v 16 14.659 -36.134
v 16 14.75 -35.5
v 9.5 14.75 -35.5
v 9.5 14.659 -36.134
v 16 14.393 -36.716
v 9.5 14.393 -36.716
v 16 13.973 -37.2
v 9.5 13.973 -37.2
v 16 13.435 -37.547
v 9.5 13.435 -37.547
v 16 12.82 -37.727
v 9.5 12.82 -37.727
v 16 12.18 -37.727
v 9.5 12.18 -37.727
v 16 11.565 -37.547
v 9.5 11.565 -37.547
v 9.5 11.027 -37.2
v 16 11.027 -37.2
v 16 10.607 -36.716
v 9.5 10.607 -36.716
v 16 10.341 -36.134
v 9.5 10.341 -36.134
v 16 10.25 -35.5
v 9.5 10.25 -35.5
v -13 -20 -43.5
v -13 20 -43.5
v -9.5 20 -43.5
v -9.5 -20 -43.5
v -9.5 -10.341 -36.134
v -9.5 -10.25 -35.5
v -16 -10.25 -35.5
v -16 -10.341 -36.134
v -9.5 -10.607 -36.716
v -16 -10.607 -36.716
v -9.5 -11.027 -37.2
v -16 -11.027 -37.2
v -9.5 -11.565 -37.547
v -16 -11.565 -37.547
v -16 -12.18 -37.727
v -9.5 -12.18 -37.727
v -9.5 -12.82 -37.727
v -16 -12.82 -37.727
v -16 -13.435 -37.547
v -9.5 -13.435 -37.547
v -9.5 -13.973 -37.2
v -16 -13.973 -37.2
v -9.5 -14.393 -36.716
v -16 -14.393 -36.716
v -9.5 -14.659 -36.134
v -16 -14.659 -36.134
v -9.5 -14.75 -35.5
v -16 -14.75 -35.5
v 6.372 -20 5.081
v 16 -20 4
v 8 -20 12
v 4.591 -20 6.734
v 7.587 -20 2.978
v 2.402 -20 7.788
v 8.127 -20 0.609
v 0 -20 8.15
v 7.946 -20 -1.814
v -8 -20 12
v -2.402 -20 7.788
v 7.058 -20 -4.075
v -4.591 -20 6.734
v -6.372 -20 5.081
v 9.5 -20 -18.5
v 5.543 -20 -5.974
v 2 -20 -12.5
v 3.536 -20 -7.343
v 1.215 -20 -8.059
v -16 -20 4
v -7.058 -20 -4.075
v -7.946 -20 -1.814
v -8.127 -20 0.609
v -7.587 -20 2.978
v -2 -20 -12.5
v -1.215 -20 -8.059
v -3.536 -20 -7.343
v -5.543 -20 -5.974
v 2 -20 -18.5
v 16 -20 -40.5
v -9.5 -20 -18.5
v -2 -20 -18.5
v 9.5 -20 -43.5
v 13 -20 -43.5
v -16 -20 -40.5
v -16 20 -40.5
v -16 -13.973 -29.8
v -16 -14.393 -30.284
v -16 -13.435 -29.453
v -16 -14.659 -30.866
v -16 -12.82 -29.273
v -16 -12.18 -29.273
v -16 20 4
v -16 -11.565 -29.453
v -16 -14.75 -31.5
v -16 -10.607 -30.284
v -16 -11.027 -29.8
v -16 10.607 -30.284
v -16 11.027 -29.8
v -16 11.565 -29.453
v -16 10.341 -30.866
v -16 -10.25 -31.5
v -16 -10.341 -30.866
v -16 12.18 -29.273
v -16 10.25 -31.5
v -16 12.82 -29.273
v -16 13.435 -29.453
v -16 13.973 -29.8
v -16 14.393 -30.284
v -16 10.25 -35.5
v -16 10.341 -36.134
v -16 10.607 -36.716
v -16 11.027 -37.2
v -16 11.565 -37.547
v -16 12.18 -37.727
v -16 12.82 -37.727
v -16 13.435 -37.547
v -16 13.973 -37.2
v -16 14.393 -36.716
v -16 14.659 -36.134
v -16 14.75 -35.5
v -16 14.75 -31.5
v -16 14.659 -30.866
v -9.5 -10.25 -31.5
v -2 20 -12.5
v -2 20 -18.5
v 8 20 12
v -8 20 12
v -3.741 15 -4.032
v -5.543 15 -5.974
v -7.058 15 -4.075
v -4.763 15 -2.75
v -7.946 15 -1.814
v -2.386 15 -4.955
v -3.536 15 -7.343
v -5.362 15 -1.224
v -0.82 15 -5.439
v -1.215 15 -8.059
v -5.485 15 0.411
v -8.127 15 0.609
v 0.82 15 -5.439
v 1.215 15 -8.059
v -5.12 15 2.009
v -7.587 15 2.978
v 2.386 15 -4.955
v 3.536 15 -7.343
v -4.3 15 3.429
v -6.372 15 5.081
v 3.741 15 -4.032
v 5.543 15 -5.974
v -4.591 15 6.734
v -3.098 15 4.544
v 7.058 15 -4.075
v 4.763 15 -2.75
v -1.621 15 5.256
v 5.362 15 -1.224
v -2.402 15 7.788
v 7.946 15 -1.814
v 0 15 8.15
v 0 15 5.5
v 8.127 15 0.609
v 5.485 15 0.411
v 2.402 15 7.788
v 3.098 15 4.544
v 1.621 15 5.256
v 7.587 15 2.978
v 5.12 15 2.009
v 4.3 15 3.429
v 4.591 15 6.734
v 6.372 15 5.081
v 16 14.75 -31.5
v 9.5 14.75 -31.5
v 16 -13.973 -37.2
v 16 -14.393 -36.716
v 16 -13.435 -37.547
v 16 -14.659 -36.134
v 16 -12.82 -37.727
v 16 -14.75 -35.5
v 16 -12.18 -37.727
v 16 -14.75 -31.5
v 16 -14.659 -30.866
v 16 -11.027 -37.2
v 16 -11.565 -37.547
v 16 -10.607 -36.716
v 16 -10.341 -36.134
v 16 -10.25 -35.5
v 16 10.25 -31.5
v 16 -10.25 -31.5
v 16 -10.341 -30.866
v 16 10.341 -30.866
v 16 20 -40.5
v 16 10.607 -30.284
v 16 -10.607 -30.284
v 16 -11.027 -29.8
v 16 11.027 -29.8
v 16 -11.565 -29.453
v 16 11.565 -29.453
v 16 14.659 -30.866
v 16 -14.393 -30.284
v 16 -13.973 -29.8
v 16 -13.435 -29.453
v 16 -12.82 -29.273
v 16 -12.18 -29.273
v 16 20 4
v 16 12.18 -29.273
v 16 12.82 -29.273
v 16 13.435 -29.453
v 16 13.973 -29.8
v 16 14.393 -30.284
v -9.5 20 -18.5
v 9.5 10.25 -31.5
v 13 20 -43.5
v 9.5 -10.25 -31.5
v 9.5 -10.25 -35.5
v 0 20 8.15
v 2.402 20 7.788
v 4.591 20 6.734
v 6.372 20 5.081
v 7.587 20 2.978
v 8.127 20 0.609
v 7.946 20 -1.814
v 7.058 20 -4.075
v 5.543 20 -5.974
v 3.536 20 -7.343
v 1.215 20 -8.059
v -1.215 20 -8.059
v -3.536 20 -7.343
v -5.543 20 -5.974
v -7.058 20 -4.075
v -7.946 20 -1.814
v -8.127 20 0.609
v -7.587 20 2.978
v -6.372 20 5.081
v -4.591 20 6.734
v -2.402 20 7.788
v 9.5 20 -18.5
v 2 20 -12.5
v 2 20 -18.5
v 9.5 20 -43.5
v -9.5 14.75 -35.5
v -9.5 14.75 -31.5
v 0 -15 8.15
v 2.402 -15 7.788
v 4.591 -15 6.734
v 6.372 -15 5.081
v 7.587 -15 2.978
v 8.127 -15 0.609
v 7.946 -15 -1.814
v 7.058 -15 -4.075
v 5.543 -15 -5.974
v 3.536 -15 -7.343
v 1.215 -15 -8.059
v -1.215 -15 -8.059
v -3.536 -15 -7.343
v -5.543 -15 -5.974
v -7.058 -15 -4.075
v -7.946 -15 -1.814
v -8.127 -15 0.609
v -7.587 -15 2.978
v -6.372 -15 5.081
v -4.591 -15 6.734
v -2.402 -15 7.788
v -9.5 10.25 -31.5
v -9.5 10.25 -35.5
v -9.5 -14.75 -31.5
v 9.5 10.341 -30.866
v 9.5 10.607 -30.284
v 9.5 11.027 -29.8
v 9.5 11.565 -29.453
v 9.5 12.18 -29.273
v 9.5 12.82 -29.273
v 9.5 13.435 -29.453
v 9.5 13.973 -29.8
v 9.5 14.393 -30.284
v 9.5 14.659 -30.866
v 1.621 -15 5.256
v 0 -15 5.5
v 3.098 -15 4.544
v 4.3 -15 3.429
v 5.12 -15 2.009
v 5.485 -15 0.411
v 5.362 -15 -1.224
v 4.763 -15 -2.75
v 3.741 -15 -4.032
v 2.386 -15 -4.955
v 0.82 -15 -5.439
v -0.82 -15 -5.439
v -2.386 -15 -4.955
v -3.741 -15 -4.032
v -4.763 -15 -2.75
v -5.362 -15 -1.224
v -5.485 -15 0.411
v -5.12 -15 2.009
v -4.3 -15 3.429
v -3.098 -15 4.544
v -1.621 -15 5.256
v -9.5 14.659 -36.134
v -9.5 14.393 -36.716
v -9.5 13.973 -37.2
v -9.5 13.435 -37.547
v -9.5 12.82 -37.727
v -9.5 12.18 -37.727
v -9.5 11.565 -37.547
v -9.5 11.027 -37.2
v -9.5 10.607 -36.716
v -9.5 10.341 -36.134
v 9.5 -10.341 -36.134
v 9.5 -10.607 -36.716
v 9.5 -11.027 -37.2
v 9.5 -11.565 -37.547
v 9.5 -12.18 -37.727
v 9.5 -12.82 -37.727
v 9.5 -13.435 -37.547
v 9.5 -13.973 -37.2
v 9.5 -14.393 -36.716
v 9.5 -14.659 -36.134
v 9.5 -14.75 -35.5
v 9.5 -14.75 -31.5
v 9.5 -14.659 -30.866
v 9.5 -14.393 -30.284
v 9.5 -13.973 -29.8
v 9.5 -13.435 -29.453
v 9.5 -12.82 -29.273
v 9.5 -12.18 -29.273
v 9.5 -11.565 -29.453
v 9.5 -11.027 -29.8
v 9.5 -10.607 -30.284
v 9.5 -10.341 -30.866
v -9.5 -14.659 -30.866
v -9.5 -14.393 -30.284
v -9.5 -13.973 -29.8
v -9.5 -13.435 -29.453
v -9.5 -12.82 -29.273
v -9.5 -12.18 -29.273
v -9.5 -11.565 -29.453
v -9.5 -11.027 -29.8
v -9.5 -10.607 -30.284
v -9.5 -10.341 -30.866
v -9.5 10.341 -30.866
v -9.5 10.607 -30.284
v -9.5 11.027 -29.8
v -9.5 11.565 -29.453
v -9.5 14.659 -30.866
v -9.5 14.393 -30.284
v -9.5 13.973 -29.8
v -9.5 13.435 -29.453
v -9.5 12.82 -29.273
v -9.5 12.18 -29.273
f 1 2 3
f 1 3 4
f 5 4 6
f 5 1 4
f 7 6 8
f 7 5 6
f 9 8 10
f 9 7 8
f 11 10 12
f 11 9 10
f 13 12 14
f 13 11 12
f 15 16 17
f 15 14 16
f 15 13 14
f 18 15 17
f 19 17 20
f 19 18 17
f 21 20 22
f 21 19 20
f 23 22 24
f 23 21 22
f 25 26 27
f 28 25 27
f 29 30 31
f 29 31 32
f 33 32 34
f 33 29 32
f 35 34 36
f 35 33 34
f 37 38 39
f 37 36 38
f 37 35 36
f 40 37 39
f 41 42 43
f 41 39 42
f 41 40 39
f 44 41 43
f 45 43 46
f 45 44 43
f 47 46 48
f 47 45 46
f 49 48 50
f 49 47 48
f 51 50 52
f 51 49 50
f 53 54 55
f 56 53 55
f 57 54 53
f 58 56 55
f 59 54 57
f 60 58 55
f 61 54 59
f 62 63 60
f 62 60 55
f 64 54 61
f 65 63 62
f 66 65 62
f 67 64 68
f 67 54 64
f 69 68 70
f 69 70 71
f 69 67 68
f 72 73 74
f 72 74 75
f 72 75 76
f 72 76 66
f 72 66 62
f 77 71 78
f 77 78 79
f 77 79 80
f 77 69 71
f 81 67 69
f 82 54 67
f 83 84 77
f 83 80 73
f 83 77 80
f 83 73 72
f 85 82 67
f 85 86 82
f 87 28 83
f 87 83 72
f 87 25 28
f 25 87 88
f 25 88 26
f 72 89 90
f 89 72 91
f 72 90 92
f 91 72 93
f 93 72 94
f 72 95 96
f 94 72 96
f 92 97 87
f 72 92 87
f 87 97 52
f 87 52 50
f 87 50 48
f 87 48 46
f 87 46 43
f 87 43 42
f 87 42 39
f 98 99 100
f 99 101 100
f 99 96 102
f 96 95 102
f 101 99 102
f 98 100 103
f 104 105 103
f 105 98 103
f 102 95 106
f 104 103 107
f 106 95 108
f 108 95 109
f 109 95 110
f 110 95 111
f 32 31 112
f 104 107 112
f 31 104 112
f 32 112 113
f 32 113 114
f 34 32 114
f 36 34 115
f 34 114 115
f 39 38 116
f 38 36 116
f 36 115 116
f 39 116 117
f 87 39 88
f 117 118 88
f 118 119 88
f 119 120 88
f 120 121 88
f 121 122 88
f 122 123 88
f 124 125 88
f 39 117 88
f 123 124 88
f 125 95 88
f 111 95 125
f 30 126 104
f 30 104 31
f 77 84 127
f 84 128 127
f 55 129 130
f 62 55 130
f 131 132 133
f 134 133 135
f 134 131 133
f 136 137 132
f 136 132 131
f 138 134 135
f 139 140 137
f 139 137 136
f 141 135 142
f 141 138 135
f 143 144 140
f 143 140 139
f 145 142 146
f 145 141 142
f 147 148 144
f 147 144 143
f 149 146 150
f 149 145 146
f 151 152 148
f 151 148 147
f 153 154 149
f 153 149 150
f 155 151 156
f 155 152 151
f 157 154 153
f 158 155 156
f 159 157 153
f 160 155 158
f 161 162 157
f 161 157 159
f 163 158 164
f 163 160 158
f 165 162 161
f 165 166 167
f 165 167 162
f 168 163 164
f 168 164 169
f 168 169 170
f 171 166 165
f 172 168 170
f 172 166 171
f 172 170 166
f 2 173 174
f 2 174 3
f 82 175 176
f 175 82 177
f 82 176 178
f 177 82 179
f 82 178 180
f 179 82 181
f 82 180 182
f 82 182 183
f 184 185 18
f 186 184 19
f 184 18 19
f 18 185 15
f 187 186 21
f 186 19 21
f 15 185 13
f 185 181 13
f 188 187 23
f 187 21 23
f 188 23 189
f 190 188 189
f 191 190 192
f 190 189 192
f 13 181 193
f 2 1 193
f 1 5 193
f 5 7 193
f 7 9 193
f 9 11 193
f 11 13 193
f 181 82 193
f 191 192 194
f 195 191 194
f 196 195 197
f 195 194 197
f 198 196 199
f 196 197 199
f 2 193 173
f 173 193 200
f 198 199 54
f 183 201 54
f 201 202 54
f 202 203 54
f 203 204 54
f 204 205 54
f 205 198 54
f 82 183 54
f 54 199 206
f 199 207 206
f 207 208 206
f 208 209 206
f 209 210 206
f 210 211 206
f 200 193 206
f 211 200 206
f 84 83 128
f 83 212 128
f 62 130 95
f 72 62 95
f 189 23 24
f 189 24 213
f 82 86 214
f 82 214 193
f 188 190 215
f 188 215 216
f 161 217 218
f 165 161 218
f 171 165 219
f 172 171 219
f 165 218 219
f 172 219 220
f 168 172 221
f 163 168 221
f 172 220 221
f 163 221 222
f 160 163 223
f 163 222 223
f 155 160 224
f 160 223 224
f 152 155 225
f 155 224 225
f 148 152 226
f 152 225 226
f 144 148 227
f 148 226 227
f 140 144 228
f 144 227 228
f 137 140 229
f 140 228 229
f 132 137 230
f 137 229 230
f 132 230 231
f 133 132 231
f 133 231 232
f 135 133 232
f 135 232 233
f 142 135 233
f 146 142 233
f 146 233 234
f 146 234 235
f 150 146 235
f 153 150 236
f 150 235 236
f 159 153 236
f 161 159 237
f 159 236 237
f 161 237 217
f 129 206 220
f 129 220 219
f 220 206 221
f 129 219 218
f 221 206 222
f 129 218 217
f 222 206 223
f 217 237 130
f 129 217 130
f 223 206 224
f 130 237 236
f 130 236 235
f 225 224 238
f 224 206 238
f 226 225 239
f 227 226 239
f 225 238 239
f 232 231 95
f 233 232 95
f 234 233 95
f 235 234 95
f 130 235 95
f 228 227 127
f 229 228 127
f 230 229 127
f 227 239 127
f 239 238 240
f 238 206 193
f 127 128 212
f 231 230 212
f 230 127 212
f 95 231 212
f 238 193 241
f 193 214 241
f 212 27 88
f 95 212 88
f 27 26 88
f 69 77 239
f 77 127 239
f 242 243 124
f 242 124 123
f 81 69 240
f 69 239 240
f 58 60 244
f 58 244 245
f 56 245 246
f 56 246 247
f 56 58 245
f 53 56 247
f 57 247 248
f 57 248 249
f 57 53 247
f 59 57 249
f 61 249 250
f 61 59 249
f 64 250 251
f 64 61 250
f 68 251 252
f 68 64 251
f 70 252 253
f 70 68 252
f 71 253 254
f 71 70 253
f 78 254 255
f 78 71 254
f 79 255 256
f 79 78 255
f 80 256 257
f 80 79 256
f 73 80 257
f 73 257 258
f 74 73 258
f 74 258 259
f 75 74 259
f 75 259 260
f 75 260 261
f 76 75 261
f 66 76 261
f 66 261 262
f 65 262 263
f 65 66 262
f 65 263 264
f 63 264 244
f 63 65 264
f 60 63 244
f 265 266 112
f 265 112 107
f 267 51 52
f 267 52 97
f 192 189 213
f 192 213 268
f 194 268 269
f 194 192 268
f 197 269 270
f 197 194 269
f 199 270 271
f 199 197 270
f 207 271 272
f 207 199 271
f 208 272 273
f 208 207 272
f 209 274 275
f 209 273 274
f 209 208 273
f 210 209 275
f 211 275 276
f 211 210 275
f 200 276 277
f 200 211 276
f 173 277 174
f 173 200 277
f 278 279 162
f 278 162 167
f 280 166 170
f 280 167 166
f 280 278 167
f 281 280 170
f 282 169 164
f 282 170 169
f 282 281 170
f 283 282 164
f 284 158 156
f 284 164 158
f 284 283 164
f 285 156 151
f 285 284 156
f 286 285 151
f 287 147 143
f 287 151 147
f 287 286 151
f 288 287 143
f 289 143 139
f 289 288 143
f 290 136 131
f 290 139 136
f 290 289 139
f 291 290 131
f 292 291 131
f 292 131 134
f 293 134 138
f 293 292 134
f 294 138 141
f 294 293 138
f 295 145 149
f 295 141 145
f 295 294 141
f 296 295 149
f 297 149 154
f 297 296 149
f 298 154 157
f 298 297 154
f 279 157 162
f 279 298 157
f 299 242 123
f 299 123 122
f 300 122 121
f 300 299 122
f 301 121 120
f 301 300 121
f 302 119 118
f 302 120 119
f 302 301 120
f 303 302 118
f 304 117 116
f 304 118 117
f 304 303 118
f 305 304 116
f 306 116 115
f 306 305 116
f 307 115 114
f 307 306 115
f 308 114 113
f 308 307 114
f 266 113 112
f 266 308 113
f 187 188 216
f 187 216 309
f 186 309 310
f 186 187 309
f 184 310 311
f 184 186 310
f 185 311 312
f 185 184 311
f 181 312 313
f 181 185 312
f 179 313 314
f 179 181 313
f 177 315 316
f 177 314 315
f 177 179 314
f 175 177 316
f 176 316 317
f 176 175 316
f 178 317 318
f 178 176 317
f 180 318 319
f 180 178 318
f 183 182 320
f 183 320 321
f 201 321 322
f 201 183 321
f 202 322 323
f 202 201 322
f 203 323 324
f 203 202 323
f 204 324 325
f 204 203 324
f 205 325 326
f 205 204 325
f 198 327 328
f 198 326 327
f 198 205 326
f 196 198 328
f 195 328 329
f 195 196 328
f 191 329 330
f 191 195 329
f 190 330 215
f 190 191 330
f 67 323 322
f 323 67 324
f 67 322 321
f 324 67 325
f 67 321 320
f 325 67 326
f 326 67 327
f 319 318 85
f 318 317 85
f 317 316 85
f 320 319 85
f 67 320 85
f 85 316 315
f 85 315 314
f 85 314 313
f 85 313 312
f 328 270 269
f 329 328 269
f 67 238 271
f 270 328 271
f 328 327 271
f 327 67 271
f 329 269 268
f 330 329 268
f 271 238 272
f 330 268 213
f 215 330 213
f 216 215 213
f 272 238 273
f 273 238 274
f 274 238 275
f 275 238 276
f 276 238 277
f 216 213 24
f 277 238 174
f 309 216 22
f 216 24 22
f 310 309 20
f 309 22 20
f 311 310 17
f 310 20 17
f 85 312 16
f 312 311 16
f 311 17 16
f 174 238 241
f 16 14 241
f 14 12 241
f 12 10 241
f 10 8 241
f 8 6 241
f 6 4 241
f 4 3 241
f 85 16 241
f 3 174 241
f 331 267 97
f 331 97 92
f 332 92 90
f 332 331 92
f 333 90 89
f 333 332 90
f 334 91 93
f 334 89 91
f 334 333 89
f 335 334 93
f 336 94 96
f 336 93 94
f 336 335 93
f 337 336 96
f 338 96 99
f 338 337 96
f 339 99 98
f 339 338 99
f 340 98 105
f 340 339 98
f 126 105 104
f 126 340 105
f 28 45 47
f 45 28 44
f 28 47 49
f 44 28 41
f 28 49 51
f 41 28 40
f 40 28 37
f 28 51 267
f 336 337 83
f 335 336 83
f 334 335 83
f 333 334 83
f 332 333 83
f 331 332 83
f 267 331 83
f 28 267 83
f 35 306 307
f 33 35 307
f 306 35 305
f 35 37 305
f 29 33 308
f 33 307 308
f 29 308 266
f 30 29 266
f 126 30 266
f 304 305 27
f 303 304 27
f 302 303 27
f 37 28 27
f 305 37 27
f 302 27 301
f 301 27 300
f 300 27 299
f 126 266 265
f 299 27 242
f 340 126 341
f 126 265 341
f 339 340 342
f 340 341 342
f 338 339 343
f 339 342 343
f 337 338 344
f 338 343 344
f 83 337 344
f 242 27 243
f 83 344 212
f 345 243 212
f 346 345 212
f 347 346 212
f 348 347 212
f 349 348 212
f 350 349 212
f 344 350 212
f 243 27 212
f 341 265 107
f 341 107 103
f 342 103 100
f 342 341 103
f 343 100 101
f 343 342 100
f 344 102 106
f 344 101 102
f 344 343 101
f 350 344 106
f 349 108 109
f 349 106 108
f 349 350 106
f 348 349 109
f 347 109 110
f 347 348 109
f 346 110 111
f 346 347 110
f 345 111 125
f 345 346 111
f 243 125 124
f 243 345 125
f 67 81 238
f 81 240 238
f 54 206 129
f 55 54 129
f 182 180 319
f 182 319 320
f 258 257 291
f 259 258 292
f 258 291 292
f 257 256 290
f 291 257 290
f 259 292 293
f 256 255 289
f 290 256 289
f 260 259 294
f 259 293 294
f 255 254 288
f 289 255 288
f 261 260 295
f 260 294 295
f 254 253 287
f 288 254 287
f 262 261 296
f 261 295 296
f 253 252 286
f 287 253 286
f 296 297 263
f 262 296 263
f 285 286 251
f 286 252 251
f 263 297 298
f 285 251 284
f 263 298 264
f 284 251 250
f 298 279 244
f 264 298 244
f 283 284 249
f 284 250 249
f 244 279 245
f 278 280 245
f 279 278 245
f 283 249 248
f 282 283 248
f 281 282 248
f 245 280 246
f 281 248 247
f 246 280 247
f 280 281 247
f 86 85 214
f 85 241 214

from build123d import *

# Parameters (mm, degrees)
SKETCH1_R           = 5.5
BOSS_EXTRUDE1_DEPTH = 20
SKETCH2_R           = 8.15
CUT_EXTRUDE1_DEPTH  = 5
CUT_EXTRUDE2_DEPTH  = 58.586890869


with BuildPart() as part:
    # Sketch1 → Boss-Extrude1 (new, symmetric)
    with BuildSketch(Plane(origin=(0, 0, 0), x_dir=(1, 0, 0), z_dir=(0, 1, 0))):
        Polygon((-9.5, 43.5), (-9.5, 18.5), (-2, 18.5), (-2, 12.5), (2, 12.5), (2, 18.5), (9.5, 18.5), (9.5, 43.5), (13, 43.5), (16, 40.5), (16, -4), (8, -12), (-8, -12), (-16, -4), (-16, 40.5), (-13, 43.5), align=None)
        with Locations(Location((0, 0, 0), (0, 0, 270))):
            Circle(SKETCH1_R, mode=Mode.SUBTRACT)
    extrude(amount=BOSS_EXTRUDE1_DEPTH, both=True)

    # Sketch2 → Cut-Extrude1 (cut)
    with BuildSketch(Plane(origin=(0, 20, 0), x_dir=(1, 0, 0), z_dir=(0, 1, 0))):
        with Locations(Location((0, 0, 0), (0, 0, 270))):
            Circle(SKETCH2_R)
    cut_extrude1 = extrude(amount=-CUT_EXTRUDE1_DEPTH, mode=Mode.SUBTRACT)

    # Mirror1: Cut-Extrude1 across plane
    add(cut_extrude1.mirror(Plane.ZX), mode=Mode.SUBTRACT)

    # Sketch3 → Cut-Extrude2 (cut, through all)
    with BuildSketch(Plane(origin=(16, 0, 0), x_dir=(0, 0, -1), z_dir=(1, 0, 0))):
        with BuildLine():
            Line((35.5, 10.25), (31.5, 10.25))
            ThreePointArc((31.5, 10.25), (29.25, 12.5), (31.5, 14.75))
            Line((31.5, 14.75), (35.5, 14.75))
            ThreePointArc((35.5, 14.75), (37.75, 12.5), (35.5, 10.25))
        make_face()
        with BuildLine():
            Line((35.5, -14.75), (31.5, -14.75))
            ThreePointArc((31.5, -14.75), (29.25, -12.5), (31.5, -10.25))
            Line((31.5, -10.25), (35.5, -10.25))
            ThreePointArc((35.5, -10.25), (37.75, -12.5), (35.5, -14.75))
        make_face()
    extrude(amount=-CUT_EXTRUDE2_DEPTH, mode=Mode.SUBTRACT)


solid = part.part
